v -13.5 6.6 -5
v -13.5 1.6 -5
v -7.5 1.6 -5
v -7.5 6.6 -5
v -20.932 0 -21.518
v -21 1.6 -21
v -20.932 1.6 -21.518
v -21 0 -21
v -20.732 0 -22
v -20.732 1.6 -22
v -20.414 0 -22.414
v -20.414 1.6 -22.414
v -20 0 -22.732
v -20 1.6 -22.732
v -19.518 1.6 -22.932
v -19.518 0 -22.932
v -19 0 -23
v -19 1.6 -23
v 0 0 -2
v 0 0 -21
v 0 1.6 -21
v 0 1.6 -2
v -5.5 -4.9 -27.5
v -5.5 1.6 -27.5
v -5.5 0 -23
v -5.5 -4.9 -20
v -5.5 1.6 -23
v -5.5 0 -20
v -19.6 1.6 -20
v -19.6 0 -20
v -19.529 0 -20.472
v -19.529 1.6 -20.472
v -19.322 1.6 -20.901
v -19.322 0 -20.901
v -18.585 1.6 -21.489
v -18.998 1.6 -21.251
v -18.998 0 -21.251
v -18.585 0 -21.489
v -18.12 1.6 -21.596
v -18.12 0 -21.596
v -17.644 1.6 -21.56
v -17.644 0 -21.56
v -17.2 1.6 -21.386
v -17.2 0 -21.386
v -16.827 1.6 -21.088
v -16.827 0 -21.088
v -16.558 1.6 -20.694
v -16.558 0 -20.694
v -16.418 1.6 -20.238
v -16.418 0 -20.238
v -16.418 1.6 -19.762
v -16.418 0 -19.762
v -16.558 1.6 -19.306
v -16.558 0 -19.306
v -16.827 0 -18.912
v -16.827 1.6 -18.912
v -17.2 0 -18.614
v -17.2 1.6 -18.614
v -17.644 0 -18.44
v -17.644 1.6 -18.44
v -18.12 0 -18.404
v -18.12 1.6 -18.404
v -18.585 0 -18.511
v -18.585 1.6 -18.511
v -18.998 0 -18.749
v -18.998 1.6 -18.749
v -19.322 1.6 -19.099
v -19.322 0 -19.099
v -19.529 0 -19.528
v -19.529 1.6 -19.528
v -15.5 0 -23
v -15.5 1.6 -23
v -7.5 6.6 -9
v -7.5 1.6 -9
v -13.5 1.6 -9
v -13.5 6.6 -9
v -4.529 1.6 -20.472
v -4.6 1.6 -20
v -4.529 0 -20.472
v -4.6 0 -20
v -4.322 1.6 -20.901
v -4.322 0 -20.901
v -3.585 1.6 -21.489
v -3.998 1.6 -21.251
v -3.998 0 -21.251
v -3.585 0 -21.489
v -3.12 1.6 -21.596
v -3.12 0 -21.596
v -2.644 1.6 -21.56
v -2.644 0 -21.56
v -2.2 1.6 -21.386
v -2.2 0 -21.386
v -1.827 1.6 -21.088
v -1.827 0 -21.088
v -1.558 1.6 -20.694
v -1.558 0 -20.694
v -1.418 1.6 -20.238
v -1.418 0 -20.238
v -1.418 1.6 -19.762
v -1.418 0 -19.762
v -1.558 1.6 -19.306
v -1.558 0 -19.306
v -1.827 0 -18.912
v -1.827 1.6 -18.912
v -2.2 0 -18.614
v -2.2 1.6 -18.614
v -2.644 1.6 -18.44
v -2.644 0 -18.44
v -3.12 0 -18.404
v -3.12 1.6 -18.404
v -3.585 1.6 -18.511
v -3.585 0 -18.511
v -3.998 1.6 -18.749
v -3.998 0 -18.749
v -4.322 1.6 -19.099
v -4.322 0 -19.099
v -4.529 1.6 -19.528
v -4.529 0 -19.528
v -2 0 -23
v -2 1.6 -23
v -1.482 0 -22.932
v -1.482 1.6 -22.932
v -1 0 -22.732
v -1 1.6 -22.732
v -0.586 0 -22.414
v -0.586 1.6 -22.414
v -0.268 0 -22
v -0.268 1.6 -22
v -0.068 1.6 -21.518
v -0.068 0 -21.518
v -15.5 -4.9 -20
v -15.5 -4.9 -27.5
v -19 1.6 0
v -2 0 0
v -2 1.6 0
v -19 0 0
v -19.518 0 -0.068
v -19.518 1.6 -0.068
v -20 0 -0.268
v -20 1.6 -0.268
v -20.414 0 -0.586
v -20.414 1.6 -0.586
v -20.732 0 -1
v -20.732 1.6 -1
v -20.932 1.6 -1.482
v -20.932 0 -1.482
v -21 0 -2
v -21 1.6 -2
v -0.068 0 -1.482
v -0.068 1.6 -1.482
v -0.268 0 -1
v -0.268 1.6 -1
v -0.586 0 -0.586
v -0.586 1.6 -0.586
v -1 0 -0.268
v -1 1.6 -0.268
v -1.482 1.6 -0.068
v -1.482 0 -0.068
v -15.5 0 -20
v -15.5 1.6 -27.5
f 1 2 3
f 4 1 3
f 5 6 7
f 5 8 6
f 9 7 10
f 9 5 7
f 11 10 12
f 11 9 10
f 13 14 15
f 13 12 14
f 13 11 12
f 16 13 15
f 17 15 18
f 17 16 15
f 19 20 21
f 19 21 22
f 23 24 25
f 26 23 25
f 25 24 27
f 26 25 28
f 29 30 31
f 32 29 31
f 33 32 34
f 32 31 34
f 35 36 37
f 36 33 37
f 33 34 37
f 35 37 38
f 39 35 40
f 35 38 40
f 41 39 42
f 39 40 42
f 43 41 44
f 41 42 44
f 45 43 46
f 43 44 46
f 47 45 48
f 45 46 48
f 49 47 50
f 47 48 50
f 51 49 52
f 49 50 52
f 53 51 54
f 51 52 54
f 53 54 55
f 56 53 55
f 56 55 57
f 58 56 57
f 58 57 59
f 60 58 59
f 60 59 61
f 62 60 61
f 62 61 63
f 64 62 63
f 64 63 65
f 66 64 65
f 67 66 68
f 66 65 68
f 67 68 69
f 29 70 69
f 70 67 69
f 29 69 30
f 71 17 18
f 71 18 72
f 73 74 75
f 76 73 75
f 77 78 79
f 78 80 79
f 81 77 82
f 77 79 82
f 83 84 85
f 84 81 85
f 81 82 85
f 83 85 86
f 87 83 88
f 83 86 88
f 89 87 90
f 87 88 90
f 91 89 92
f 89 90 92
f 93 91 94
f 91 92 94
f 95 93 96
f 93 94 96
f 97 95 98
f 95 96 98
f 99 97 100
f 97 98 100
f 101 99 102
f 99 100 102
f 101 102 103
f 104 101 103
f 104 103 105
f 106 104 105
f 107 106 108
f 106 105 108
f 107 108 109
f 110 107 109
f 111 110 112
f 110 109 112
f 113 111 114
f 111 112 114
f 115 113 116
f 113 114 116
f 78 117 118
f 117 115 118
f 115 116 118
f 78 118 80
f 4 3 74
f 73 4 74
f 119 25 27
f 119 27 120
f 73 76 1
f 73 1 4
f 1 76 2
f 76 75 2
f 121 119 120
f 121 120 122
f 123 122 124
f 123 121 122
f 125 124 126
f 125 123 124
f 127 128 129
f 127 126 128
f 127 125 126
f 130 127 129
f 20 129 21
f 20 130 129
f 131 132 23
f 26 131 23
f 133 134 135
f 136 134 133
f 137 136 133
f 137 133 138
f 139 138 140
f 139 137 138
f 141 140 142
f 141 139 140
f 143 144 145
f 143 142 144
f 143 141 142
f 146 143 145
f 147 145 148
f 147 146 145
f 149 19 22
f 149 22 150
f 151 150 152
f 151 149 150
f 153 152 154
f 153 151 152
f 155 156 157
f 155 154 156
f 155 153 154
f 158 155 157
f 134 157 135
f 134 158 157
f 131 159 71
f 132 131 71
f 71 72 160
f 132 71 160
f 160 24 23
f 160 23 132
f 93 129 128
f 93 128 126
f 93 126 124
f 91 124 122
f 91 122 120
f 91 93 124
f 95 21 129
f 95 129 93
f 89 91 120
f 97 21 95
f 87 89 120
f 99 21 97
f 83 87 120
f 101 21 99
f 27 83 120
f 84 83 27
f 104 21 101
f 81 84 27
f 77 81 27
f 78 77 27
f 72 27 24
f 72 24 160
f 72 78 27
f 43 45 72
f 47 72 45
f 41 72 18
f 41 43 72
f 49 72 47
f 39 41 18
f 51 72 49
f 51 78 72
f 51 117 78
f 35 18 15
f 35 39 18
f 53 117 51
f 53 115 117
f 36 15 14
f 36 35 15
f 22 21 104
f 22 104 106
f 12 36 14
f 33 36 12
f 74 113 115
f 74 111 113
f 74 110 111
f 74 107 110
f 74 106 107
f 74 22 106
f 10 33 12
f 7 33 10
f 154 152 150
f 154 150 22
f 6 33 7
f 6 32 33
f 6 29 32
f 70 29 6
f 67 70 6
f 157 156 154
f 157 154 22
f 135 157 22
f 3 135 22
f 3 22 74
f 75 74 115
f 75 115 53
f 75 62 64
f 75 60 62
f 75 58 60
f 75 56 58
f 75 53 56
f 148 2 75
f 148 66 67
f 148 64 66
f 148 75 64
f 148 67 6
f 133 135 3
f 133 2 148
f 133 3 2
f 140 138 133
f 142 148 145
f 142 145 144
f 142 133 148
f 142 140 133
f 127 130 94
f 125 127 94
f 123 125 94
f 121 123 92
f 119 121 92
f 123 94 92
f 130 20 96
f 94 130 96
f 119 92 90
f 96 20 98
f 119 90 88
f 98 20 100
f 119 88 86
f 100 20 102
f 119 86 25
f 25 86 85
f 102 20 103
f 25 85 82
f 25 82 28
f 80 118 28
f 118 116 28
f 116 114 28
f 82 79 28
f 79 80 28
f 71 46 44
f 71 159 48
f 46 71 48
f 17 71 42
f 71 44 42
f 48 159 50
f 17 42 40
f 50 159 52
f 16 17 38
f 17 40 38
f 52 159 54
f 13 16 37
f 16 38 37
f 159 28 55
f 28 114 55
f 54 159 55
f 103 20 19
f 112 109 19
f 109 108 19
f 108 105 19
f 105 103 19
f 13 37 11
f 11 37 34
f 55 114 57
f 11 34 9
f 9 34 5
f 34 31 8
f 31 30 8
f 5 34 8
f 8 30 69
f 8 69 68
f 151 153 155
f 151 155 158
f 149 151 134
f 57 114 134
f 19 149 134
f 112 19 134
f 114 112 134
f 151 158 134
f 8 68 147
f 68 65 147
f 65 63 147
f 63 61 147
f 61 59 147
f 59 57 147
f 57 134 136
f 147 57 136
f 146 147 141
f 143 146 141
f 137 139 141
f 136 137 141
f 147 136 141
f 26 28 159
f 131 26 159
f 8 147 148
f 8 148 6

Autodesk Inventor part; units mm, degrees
ref_plane "YZ Plane" through (0, 0, 0) normal (1, 0, 0) x (0, 1, 0)
ref_plane "XZ Plane" through (0, 0, 0) normal (0, 1, 0) x (-1, 0, 0)
ref_plane "XY Plane" through (0, 0, 0) normal (0, 0, 1) x (1, 0, 0)
sketch "Эскиз1" plane through (0, 0, 0) normal (0, 1, 0) x (-1, 0, 0)
  line L0 (2, 0) -> (19, 0)
  line L1 (21, -2) -> (21, -21)
  line L2 (19, -23) -> (2, -23)
  line L3 (0, -21) -> (0, -2)
  circle A0 centre (18, -20) radius 1.6
  circle A1 centre (3, -20) radius 1.6
  arc A2 (19, -23) -> (21, -21) centre (19, -21) ccw
  arc A3 (0, -21) -> (2, -23) centre (2, -21) ccw
  arc A4 (2, 0) -> (0, -2) centre (2, -2) ccw
  arc A5 (21, -2) -> (19, 0) centre (19, -2) ccw
  point P0 (0, 0)
  dimension "d6" = 2
  dimension "d20" = 15
  dimension "d21" = 3
  dimension "d22" = 3
extrude "Выдавливание1" add sketch "Эскиз1" along normal blind 1.6
sketch "Эскиз2" plane through (0, 1.6, 0) normal (0, 1, 0) x (1, 0, 0)
  circle A0 centre (-18, 20) radius 1.6 projected
  circle A1 centre (-3, 20) radius 1.6 projected
  line L0 (-10.5, 27.5) -> (-5.5, 27.5)
  line L1 (-5.5, 27.5) -> (-15.5, 27.5)
  line L2 (-15.5, 27.5) -> (-5.5, 27.5)
  line L3 (-5.5, 27.5) -> (-5.5, 20)
  line L4 (-5.5, 20) -> (-15.5, 20)
  line L5 (-15.5, 20) -> (-15.5, 27.5)
  point P0 (0, 0)
extrude "Выдавливание2" add sketch "Эскиз2" against normal blind 6.5 contours L0 L3 L4 L5 L1
sketch "Эскиз3" plane through (0, 1.6, 0) normal (0, 1, 0) x (1, 0, 0)
  line L0 (-5.5, 20) -> (-15.5, 20) projected
  line L1 (-10.5, 20) -> (-10.5, 5)
  line L2 (-10.5, 5) -> (-13.5, 5)
  line L3 (-10.5, 5) -> (-7.5, 5)
  line L4 (-13.5, 5) -> (-7.5, 5)
  line L5 (-7.5, 5) -> (-7.5, 9)
  line L6 (-7.5, 9) -> (-13.5, 9)
  line L7 (-13.5, 9) -> (-13.5, 5)
  line L8 (-21, 21) -> (-21, 2) projected
  line L9 (0, 2) -> (0, 21) projected
  point P0 (0, 0)
  dimension "d14" = 15
  dimension "d15" = 3
  dimension "d16" = 3
  dimension "d17" = 4
  dimension "d23" = 7.5
  dimension "d24" = 7.5
extrude "Выдавливание3" add sketch "Эскиз3" along normal blind 5
properties part number "Temp_Module"
